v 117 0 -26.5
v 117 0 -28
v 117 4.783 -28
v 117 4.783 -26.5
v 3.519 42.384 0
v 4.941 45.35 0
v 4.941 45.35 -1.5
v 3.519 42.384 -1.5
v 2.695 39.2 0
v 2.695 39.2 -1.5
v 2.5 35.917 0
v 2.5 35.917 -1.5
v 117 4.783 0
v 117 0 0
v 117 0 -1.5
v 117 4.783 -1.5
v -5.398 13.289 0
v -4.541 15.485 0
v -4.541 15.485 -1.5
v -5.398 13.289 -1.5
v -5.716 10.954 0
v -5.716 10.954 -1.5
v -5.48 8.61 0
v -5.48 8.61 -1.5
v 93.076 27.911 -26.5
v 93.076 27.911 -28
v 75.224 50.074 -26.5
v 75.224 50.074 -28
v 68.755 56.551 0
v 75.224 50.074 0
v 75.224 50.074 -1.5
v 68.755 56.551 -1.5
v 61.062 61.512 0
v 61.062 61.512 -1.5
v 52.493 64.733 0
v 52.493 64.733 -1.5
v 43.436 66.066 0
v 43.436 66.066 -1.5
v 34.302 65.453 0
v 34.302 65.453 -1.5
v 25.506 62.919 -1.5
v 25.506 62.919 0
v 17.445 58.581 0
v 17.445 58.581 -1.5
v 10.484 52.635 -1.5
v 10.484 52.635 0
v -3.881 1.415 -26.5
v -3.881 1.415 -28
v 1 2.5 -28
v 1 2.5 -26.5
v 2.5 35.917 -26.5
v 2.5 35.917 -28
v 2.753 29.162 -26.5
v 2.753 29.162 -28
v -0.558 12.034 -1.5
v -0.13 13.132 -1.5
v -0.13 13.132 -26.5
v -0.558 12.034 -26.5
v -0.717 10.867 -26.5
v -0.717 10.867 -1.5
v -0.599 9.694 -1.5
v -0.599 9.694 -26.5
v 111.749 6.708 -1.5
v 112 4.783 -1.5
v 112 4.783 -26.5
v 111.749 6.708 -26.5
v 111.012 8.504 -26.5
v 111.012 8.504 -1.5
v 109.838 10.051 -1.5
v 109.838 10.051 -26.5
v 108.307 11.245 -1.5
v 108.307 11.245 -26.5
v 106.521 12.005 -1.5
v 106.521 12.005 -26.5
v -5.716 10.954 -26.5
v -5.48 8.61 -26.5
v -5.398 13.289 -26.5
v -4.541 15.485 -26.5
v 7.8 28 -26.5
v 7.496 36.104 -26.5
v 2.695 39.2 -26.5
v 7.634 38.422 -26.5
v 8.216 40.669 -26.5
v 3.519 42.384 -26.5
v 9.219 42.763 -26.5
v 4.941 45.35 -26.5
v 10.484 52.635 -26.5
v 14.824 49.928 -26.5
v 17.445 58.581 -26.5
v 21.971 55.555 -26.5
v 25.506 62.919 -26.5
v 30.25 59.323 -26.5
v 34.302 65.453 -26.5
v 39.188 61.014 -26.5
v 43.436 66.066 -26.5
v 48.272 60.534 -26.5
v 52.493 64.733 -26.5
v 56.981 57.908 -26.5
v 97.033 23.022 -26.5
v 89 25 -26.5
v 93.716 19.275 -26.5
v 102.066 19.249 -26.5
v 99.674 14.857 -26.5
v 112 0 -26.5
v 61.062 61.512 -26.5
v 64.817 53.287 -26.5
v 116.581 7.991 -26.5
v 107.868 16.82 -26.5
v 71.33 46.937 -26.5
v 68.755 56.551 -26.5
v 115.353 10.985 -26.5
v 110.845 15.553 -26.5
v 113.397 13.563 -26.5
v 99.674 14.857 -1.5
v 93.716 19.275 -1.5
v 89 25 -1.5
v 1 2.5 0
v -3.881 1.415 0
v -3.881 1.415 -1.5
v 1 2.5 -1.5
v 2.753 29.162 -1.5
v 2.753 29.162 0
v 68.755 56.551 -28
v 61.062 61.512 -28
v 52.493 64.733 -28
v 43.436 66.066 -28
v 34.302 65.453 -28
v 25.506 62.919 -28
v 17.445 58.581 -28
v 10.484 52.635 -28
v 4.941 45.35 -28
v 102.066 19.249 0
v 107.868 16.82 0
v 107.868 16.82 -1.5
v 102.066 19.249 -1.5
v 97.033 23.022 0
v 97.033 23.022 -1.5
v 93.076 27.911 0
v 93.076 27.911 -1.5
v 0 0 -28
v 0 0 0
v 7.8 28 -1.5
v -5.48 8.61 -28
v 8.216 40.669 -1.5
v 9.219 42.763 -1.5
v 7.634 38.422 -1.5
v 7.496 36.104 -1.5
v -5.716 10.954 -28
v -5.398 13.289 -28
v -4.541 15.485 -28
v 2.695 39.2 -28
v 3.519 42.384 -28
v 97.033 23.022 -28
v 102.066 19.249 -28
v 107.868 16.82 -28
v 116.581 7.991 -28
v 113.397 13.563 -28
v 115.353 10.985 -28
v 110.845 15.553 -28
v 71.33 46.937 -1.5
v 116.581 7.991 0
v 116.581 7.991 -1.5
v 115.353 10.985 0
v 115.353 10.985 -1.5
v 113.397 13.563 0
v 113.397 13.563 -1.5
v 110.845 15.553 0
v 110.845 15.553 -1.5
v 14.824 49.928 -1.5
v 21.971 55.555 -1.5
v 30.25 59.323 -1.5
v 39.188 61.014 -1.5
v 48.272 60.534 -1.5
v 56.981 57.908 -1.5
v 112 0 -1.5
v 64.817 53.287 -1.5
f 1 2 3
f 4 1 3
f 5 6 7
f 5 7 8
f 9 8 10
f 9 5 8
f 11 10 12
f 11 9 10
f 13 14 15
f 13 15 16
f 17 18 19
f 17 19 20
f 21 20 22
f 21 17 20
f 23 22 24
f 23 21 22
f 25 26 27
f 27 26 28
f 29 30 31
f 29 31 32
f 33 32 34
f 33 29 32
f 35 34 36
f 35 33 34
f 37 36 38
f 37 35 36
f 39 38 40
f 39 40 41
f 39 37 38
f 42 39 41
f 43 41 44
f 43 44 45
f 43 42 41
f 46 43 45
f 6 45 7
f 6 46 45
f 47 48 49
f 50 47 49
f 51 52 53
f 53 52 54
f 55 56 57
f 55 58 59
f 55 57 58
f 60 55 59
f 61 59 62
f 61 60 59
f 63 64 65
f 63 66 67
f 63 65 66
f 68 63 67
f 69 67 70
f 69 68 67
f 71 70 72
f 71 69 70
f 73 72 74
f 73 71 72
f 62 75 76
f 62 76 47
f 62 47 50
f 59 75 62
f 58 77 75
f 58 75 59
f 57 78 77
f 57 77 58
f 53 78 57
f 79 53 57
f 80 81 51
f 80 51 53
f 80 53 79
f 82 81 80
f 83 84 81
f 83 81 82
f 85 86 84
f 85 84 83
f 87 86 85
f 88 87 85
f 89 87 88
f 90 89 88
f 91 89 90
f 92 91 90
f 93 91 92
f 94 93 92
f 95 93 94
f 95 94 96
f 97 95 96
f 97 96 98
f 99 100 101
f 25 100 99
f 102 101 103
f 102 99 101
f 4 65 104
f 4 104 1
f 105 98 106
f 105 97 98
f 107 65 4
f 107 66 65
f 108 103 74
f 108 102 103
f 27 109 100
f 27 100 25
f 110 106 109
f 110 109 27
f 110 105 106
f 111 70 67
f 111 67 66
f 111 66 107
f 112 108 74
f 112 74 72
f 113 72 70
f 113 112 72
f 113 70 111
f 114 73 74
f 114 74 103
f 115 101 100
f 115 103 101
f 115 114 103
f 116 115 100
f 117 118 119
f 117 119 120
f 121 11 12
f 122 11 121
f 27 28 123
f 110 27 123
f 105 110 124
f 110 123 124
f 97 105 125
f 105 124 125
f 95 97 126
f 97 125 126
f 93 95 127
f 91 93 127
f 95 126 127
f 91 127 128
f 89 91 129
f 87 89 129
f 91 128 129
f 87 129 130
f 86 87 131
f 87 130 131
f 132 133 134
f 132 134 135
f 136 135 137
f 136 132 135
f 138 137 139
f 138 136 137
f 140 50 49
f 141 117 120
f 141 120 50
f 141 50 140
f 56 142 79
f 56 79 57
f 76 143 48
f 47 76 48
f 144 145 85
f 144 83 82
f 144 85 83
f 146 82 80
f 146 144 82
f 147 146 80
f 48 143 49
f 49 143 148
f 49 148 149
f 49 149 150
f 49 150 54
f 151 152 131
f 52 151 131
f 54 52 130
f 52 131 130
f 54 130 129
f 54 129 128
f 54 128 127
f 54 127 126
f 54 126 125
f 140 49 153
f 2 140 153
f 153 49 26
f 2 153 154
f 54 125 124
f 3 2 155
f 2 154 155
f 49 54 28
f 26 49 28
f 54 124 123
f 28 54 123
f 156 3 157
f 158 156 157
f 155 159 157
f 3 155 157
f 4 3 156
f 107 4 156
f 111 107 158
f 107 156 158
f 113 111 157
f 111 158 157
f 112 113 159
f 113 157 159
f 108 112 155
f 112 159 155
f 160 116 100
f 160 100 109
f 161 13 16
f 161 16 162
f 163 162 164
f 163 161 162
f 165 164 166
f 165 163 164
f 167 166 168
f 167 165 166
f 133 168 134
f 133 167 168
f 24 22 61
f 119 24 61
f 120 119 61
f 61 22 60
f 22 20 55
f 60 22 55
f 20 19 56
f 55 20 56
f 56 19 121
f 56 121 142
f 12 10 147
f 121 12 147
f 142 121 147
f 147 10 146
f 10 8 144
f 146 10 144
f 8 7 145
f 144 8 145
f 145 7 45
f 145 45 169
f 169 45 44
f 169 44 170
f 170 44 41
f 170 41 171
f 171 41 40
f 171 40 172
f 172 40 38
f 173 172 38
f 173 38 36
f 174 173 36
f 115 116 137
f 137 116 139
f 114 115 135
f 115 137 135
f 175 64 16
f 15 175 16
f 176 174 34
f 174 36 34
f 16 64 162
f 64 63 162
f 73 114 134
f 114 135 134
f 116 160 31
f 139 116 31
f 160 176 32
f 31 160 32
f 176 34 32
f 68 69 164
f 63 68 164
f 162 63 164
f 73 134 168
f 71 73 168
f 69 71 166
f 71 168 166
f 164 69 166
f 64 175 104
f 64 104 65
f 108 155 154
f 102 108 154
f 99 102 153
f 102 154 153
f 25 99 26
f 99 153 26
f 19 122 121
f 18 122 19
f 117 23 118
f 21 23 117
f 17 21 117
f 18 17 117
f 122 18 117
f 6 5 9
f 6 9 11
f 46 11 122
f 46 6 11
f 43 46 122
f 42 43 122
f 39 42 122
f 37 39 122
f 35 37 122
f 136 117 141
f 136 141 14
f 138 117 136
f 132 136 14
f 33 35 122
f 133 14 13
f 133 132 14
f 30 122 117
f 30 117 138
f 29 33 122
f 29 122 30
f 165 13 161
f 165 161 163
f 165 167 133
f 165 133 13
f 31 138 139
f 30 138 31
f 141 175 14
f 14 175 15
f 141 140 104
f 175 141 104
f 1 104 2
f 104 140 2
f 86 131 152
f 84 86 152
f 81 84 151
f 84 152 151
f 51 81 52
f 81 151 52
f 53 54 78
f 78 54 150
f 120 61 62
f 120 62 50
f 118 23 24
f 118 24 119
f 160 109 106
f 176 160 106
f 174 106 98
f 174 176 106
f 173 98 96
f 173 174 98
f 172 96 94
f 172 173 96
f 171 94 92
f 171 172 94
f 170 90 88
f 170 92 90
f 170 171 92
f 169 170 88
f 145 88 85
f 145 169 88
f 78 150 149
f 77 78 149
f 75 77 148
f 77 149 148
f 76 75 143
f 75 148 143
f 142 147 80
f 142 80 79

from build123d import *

# Parameters (mm, degrees)
AUFSATZ_LINEAR_AUSTRAGEN1_DEPTH = 28
AUFSATZ_LINEAR_AUSTRAGEN2_DEPTH = 1.5


with BuildPart() as part:
    # Skizze2 → Aufsatz-Linear austragen1 (new body)
    with BuildSketch(Plane.XY):
        with BuildLine():
            Line((0, 0), (112, 0))
            Line((112, 0), (112, 4.782759721))
            ThreePointArc((112, 4.782759721), (110.475234931, 9.315591895), (106.520915328, 12.005356293))
            ThreePointArc((106.520915328, 12.005356293), (96.560287053, 16.884466202), (89, 25))
            Line((89, 25), (71.329947288, 46.937212002))
            ThreePointArc((71.329947288, 46.937212002), (39.188190047, 61.014465273), (9.219098516, 42.763022288))
            ThreePointArc((9.219098516, 42.763022288), (7.87025923, 39.559587955), (7.496101502, 36.103959945))
            Line((7.496101502, 36.103959945), (7.8, 28))
            Line((7.8, 28), (-0.129590409, 13.132017983))
            ThreePointArc((-0.129590409, 13.132017983), (-0.671897822, 11.455219867), (-0.598761004, 9.694424518))
            Line((-0.598761004, 9.694424518), (1, 2.5))
            Line((1, 2.5), (0, 0))
        make_face()
    extrude(amount=-AUFSATZ_LINEAR_AUSTRAGEN1_DEPTH)

    # Skizze3 → Aufsatz-Linear austragen2 (add)
    with BuildSketch(Plane.XY):
        with BuildLine():
            Line((93.075548833, 27.910970342), (75.223854733, 50.073688497))
            ThreePointArc((75.223854733, 50.073688497), (38.852918908, 66.003211935), (4.94052586, 45.350263295))
            ThreePointArc((4.94052586, 45.350263295), (3.029670204, 40.812064656), (2.499613424, 35.916591642))
            Line((2.499613424, 35.916591642), (2.752920862, 29.161726616))
            Line((2.752920862, 29.161726616), (-4.541355115, 15.48495916))
            ThreePointArc((-4.541355115, 15.48495916), (-5.625969942, 12.131362926), (-5.479696305, 8.609772229))
            Line((-5.479696305, 8.609772229), (-3.880935301, 1.415347711))
            Line((-3.880935301, 1.415347711), (1, 2.5))
            Line((1, 2.5), (-0.598761004, 9.694424518))
            ThreePointArc((-0.598761004, 9.694424518), (-0.671897822, 11.455219867), (-0.129590409, 13.132017983))
            Line((-0.129590409, 13.132017983), (7.8, 28))
            Line((7.8, 28), (7.496101502, 36.103959945))
            ThreePointArc((7.496101502, 36.103959945), (7.87025923, 39.559587955), (9.219098516, 42.763022288))
            ThreePointArc((9.219098516, 42.763022288), (39.188190047, 61.014465273), (71.329947288, 46.937212002))
            Line((71.329947288, 46.937212002), (89, 25))
            ThreePointArc((89, 25), (96.560287053, 16.884466202), (106.520915328, 12.005356293))
            ThreePointArc((106.520915328, 12.005356293), (110.475234931, 9.315591895), (112, 4.782759721))
            Line((112, 4.782759721), (112, 0))
            Line((112, 0), (117, 0))
            Line((117, 0), (117, 4.782759721))
            ThreePointArc((117, 4.782759721), (114.458724885, 12.337480011), (107.868192213, 16.820420674))
            ThreePointArc((107.868192213, 16.820420674), (99.43268373, 20.97962177), (93.075548833, 27.910970342))
        make_face()
    aufsatz_linear_austragen2 = extrude(amount=-AUFSATZ_LINEAR_AUSTRAGEN2_DEPTH)

    # Spiegeln1: Aufsatz-Linear austragen2 across plane
    add(aufsatz_linear_austragen2.mirror(Plane.XY.offset(-14)))


solid = part.part
